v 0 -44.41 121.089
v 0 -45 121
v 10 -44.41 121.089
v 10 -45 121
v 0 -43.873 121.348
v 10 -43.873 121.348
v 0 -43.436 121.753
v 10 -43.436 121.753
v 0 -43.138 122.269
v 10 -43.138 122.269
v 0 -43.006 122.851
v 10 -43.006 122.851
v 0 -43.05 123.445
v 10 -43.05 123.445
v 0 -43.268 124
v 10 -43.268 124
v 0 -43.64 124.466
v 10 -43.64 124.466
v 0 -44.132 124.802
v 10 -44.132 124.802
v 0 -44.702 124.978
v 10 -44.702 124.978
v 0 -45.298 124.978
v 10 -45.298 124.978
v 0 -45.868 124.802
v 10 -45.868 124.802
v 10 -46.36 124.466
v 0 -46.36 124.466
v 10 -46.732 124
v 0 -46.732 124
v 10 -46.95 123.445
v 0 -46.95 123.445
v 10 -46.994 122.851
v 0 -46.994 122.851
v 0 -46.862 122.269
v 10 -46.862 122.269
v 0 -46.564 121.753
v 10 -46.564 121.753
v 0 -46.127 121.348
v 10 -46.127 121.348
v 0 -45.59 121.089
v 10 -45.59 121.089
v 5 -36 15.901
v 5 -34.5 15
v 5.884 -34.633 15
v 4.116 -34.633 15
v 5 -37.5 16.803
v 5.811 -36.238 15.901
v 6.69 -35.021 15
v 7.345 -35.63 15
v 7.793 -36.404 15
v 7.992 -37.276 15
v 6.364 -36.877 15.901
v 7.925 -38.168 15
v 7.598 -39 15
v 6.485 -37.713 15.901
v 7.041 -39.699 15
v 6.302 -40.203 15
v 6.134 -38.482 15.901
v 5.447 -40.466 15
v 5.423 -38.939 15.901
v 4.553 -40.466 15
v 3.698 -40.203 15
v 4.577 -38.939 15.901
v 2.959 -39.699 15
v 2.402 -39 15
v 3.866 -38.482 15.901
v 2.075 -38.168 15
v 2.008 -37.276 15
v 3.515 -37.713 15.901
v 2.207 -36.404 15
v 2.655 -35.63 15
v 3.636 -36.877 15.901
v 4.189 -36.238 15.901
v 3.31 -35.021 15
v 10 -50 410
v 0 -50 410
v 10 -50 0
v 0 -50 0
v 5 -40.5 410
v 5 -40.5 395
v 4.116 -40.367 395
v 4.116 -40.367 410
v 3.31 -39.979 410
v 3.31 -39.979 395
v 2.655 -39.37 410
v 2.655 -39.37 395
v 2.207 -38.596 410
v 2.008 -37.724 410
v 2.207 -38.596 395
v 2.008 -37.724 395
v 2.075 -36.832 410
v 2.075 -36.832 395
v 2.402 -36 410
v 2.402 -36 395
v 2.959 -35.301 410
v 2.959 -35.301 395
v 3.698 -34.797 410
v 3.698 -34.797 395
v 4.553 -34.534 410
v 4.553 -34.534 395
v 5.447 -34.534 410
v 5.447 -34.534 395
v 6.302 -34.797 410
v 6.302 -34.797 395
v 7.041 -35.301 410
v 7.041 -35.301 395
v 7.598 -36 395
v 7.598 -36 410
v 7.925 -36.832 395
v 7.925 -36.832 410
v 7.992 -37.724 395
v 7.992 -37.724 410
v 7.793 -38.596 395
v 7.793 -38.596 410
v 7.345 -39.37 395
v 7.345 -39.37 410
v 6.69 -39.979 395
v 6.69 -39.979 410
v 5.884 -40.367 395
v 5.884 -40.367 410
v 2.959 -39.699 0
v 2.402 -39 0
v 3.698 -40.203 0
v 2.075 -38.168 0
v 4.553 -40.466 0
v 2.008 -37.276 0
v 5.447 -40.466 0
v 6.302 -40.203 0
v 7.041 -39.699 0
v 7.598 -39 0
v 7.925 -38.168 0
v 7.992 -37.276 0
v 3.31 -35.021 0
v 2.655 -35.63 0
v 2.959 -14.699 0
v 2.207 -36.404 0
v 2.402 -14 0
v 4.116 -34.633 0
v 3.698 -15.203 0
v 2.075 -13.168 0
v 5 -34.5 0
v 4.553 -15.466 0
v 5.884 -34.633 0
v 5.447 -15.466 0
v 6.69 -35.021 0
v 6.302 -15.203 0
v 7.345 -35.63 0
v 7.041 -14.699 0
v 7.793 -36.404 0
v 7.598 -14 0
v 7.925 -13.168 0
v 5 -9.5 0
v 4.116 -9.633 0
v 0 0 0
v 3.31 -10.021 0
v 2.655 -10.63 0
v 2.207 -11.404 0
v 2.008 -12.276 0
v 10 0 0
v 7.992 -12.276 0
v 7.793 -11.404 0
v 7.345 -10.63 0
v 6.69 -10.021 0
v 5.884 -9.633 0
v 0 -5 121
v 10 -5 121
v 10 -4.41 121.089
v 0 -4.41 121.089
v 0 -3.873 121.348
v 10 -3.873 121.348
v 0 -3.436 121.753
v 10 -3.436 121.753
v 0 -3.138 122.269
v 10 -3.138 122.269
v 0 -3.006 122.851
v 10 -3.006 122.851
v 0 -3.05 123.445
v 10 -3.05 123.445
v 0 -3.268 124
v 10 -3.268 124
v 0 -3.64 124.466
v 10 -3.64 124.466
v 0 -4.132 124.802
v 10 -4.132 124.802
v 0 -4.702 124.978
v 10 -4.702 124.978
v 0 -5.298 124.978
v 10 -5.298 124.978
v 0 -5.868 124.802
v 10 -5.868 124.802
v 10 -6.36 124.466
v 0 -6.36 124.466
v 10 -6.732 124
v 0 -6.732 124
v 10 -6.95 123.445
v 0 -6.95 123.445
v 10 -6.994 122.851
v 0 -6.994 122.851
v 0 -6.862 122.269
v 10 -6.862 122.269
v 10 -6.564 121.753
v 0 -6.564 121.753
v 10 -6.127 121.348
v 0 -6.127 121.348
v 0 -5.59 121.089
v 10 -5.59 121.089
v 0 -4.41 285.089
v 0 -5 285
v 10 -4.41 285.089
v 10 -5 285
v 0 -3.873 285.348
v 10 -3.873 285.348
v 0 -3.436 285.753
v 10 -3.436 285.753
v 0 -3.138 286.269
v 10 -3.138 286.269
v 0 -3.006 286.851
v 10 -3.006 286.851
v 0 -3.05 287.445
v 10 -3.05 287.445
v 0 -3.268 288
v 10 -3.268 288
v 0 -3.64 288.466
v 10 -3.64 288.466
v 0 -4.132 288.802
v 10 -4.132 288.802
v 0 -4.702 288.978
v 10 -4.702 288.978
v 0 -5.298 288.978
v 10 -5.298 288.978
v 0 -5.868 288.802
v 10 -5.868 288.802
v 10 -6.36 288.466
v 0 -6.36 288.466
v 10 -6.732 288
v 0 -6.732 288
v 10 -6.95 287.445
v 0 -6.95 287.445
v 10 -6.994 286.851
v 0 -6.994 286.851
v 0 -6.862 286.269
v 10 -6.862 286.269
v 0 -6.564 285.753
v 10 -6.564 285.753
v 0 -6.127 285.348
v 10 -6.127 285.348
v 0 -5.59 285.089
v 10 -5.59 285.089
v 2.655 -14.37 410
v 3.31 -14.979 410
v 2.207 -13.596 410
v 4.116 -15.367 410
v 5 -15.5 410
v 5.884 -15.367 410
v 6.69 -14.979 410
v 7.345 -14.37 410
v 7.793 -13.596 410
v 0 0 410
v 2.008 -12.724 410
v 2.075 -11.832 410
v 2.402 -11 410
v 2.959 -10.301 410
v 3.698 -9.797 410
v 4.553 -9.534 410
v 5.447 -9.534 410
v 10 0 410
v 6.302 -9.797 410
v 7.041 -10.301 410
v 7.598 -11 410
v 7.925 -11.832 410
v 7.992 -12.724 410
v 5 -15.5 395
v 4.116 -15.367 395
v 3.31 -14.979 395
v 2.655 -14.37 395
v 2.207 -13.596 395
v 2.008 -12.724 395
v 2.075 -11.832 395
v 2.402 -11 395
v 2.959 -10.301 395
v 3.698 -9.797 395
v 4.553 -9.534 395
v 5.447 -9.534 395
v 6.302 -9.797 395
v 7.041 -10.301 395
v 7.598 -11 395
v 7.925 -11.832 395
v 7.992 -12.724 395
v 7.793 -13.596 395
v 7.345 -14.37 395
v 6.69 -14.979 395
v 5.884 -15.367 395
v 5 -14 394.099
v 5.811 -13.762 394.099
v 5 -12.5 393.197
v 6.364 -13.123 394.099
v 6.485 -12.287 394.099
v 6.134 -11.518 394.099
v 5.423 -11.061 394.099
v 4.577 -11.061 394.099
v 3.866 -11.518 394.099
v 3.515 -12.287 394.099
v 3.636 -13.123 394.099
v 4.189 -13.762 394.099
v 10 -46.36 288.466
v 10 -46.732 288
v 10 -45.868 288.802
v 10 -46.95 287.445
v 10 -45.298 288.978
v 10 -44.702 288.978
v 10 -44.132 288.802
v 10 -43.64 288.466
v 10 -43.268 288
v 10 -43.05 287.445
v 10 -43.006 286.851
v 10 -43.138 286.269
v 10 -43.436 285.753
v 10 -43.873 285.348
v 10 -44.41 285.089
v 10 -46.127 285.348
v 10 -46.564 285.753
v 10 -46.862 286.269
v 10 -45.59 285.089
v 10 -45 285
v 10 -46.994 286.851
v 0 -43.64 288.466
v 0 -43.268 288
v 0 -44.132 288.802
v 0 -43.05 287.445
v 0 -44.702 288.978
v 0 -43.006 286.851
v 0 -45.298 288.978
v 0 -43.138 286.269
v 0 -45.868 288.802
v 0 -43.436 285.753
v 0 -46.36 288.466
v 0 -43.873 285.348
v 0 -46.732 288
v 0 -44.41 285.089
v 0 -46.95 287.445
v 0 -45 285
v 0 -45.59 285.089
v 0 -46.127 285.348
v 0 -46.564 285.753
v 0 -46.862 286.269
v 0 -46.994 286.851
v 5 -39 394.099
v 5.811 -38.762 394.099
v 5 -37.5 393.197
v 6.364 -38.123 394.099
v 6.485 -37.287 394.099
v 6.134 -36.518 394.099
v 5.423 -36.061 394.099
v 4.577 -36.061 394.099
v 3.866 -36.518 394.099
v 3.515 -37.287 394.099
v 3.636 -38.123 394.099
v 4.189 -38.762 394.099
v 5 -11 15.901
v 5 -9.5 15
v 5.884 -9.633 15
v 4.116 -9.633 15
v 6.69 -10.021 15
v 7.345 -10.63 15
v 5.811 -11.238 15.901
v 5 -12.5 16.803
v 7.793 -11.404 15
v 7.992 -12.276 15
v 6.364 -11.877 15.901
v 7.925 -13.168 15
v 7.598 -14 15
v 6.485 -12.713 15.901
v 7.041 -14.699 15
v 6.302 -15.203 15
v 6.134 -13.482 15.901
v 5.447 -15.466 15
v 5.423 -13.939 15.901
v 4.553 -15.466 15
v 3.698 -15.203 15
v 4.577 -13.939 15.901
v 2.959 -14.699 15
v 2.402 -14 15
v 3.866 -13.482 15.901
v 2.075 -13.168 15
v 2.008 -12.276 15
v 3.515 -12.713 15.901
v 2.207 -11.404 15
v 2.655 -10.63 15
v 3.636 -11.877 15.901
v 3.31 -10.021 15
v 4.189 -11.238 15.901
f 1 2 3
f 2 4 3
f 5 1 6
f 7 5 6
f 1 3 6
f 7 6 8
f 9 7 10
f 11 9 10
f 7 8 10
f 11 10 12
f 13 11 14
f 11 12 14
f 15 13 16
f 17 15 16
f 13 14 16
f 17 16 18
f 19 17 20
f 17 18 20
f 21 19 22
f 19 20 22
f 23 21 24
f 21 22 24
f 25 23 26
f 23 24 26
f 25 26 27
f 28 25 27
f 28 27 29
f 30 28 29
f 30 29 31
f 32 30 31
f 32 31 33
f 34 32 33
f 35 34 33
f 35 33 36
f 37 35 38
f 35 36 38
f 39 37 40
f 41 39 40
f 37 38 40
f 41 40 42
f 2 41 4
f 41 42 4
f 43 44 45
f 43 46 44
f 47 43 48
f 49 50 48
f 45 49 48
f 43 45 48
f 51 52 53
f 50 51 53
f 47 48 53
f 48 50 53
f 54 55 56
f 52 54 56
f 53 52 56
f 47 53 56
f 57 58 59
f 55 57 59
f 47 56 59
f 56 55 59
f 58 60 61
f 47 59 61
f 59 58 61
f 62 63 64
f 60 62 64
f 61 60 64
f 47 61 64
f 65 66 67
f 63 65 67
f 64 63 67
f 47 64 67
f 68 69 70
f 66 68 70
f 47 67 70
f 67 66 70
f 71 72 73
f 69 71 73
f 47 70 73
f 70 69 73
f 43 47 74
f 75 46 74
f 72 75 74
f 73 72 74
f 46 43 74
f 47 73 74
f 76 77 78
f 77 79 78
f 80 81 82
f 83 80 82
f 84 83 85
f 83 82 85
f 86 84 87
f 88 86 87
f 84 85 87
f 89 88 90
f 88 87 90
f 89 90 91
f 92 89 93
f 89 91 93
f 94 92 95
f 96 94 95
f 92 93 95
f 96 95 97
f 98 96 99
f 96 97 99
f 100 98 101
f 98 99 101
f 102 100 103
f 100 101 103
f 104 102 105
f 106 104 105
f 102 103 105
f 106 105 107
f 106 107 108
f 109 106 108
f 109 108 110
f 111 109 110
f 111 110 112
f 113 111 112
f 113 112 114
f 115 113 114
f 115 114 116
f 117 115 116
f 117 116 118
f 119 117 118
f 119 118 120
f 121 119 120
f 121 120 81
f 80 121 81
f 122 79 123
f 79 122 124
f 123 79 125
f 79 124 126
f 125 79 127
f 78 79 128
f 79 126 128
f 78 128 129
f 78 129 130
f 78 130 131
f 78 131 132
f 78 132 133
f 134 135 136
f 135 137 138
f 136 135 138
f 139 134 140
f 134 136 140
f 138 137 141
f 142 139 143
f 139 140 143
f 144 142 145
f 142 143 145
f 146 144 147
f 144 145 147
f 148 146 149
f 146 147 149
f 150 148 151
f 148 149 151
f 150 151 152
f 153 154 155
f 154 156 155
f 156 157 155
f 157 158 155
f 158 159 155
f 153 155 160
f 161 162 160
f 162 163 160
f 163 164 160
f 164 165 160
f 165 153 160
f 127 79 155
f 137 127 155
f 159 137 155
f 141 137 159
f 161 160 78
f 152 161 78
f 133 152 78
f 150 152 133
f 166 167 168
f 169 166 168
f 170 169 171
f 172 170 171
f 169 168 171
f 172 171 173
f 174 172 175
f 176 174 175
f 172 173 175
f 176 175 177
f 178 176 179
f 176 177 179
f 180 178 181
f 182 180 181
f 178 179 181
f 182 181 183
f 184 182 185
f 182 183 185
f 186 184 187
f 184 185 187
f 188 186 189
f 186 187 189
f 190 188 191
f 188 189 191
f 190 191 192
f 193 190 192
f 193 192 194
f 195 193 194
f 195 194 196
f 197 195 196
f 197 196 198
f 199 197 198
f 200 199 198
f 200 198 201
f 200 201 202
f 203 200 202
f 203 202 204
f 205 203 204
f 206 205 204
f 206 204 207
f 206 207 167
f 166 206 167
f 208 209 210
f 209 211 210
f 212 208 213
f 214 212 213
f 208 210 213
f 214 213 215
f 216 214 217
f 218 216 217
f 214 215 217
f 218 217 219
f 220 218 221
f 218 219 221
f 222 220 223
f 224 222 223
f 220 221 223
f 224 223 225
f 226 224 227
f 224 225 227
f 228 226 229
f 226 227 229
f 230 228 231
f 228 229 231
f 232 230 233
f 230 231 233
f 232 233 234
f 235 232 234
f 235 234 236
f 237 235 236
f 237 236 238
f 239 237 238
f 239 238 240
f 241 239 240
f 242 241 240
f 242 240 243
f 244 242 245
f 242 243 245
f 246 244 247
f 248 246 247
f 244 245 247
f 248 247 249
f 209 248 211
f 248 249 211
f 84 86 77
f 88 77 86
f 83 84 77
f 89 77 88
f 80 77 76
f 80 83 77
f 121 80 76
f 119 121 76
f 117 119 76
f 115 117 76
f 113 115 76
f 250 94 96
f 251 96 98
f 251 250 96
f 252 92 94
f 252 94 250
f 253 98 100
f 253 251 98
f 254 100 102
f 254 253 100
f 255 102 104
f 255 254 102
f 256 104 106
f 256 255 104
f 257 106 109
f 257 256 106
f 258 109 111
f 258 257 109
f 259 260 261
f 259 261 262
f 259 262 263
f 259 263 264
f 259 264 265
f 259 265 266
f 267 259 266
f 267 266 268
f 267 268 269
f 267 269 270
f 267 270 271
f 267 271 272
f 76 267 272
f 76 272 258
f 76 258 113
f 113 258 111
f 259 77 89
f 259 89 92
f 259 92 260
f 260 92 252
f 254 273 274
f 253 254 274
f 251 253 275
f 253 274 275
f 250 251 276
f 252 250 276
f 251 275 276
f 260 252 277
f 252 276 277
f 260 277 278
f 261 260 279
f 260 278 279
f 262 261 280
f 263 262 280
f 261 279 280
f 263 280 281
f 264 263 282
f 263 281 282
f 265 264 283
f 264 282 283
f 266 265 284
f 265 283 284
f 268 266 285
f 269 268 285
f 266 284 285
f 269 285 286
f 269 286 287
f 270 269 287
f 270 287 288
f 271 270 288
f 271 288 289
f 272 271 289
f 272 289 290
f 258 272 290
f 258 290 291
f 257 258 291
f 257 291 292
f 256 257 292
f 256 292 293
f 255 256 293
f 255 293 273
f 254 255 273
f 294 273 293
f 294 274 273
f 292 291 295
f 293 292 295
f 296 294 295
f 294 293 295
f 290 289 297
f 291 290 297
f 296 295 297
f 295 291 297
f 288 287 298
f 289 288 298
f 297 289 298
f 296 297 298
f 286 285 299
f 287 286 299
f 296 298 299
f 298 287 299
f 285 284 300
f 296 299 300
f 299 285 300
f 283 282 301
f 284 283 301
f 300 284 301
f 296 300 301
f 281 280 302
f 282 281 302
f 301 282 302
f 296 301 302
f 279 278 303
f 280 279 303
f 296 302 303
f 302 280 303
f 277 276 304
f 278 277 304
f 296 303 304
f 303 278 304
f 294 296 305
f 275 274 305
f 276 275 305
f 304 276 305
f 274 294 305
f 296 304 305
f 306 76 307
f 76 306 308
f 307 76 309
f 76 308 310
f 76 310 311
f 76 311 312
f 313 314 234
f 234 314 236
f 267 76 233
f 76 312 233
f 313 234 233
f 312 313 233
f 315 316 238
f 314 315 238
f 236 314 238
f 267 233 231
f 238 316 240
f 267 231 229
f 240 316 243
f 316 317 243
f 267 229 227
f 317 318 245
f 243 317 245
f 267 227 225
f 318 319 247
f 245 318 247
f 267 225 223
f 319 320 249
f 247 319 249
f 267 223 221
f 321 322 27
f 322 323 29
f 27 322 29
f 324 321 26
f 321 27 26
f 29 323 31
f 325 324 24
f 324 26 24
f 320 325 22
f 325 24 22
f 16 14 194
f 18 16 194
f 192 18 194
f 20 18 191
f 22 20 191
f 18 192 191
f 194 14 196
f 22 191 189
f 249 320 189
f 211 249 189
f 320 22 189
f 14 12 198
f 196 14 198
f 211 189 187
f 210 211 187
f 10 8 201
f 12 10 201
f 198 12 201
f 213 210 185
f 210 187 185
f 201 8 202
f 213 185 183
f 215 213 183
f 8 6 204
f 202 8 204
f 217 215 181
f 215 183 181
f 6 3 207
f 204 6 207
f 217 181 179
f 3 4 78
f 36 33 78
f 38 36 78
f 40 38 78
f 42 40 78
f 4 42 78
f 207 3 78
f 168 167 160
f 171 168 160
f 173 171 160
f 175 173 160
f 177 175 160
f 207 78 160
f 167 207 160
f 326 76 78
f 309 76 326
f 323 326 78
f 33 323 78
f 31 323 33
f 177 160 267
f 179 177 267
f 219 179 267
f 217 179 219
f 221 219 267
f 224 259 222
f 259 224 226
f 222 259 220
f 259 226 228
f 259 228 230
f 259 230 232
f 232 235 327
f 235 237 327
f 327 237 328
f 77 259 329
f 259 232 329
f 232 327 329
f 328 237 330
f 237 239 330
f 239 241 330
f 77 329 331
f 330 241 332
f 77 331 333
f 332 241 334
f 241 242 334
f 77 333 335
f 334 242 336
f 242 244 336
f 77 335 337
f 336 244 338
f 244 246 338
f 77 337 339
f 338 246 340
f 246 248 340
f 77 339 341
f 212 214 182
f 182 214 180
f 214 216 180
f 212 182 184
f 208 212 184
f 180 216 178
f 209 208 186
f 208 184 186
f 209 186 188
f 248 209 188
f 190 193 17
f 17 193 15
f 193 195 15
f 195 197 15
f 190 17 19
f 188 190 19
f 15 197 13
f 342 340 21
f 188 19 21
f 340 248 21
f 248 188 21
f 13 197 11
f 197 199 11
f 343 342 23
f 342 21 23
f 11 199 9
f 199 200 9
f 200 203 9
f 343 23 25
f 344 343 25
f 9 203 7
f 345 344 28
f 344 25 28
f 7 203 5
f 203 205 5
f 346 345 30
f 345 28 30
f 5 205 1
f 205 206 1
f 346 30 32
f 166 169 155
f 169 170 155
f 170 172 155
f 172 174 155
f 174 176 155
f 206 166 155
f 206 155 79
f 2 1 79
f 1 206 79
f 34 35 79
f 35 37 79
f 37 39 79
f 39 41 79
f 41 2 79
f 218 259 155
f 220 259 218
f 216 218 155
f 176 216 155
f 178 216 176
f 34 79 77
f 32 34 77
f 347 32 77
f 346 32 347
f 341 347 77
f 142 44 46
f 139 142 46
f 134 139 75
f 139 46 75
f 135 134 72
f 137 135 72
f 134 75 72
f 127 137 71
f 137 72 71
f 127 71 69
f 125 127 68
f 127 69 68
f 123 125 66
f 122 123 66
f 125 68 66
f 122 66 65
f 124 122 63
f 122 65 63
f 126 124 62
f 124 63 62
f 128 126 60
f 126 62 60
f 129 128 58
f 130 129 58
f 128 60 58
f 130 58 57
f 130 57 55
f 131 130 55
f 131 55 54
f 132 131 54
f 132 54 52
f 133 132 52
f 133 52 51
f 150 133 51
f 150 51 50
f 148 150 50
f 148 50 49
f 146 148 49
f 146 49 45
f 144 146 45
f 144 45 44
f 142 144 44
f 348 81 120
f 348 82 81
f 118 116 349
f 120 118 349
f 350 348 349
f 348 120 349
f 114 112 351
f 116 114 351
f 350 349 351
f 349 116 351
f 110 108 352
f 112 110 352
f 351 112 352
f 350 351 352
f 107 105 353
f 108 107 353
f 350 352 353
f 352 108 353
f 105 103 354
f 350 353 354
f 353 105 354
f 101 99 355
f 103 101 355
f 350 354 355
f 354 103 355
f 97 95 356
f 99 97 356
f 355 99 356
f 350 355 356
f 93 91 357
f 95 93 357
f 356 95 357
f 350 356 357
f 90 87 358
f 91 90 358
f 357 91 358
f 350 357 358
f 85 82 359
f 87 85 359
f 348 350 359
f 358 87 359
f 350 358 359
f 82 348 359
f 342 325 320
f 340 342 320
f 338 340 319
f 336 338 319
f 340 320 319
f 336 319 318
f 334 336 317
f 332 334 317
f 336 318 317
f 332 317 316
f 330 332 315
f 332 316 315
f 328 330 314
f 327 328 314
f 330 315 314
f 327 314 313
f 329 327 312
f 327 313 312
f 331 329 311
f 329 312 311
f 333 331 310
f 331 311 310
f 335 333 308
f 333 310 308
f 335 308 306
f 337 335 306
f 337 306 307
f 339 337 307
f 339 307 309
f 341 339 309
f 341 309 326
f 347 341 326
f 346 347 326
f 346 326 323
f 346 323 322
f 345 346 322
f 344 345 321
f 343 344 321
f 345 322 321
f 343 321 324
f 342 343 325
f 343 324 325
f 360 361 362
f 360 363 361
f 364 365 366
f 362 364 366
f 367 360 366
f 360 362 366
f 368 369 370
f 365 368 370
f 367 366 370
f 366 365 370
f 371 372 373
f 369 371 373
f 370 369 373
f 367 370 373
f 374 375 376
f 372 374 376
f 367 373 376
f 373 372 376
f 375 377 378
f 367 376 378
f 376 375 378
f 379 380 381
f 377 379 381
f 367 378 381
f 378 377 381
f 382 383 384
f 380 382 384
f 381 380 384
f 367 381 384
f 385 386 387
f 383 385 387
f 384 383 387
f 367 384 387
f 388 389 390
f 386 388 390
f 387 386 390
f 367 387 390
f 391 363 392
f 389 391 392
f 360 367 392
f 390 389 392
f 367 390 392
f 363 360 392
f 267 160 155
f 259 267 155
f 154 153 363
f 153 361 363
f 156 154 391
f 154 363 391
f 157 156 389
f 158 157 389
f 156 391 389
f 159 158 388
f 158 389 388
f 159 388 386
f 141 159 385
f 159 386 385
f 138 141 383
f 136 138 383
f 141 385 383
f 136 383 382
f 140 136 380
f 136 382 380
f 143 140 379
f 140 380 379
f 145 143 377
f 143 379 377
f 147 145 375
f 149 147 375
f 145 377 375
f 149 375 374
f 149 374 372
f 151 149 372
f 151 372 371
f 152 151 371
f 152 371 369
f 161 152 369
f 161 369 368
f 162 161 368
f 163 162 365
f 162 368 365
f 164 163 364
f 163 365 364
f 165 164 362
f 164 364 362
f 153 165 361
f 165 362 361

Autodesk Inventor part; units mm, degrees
ref_plane "YZ Plane" through (0, 0, 0) normal (1, 0, 0) x (0, 1, 0)
ref_plane "XZ Plane" through (0, 0, 0) normal (0, 1, 0) x (-1, 0, 0)
ref_plane "XY Plane" through (0, 0, 0) normal (0, 0, 1) x (1, 0, 0)
sketch "Sketch1" plane through (0, 0, 0) normal (0, 0, 1) x (1, 0, 0)
  line L0 (0, 0) -> (0, -50)
  line L1 (0, -50) -> (10, -50)
  line L2 (10, -50) -> (10, 0)
  line L3 (10, 0) -> (0, 0)
  dimension "d1" = 50
  dimension "d2" = 10
extrude "Extrusion1" add sketch "Sketch1" along normal blind 410
sketch "Sketch2" plane through (0, 0, 0) normal (0, 0, -1) x (-1, 0, 0)
  circle A0 centre (-5, -12.5) radius 3
  circle A1 centre (-5, -37.5) radius 3
  line L0 (-10, -50) -> (-10, 0) projected
  line L1 (-10, 0) -> (0, 0) projected
  line L2 (0, -50) -> (-10, -50) projected
  dimension "d5" = 6
  dimension "d6" = 6
  dimension "d7" = 5
  dimension "d8" = 5
  dimension "d9" = 12.5
  dimension "d10" = 12.5
sketch "Sketch3" plane through (0, 0, 410) normal (0, 0, 1) x (1, 0, 0)
  circle A0 centre (5, -12.5) radius 3 projected
  circle A1 centre (5, -12.5) radius 3
  circle A2 centre (5, -37.5) radius 3 projected
  circle A3 centre (5, -37.5) radius 3
  point P0 (0, 0)
hole "Agujero2" at (5, -12.5, 0) at (5, -37.5, 0) direction (0, 0, 1) diameter 6 depth 15 tip angle 118
hole "Agujero3" at (5, -12.5, 410) at (5, -37.5, 410) direction (0, 0, -1) diameter 6 depth 15 tip angle 118
thread "Rosca5" size "M6x1" class "6H" standard "ISO Metric profile" length 10
thread "Rosca6" size "M6x1" class "6H" standard "ISO Metric profile" length 10
thread "Rosca7" size "M6x1" class "6H" standard "ISO Metric profile" length 430
thread "Rosca8" size "M6x1" class "6H" standard "ISO Metric profile" length 430
sketch "Boceto4" plane through (10, -50, 0) normal (1, 0, 0) x (0, 0, -1)
  circle A0 centre (-287, 45) radius 2
  circle A1 centre (-287, 5) radius 2
  circle A2 centre (-123, 5) radius 2
  circle A3 centre (-123, 45) radius 2
  line L0 (-410, 0) -> (-410, 50) projected
  line L1 (0, 0) -> (0, 50) projected
  line L2 (0, 50) -> (-410, 50) projected
  dimension "d52" = 4
  dimension "d53" = 4
  dimension "d54" = 4
  dimension "d55" = 4
  dimension "d56" = 123
  dimension "d57" = 123
  dimension "d60" = 5
  dimension "d63" = 5
  dimension "d74" = 40
  dimension "d75" = 40
extrude "Extrusión4" cut sketch "Boceto4" against normal blind 10
equation "\"d63\" = d60"
properties part number "Travesaño Estructural" material "Aluminum 6061"
